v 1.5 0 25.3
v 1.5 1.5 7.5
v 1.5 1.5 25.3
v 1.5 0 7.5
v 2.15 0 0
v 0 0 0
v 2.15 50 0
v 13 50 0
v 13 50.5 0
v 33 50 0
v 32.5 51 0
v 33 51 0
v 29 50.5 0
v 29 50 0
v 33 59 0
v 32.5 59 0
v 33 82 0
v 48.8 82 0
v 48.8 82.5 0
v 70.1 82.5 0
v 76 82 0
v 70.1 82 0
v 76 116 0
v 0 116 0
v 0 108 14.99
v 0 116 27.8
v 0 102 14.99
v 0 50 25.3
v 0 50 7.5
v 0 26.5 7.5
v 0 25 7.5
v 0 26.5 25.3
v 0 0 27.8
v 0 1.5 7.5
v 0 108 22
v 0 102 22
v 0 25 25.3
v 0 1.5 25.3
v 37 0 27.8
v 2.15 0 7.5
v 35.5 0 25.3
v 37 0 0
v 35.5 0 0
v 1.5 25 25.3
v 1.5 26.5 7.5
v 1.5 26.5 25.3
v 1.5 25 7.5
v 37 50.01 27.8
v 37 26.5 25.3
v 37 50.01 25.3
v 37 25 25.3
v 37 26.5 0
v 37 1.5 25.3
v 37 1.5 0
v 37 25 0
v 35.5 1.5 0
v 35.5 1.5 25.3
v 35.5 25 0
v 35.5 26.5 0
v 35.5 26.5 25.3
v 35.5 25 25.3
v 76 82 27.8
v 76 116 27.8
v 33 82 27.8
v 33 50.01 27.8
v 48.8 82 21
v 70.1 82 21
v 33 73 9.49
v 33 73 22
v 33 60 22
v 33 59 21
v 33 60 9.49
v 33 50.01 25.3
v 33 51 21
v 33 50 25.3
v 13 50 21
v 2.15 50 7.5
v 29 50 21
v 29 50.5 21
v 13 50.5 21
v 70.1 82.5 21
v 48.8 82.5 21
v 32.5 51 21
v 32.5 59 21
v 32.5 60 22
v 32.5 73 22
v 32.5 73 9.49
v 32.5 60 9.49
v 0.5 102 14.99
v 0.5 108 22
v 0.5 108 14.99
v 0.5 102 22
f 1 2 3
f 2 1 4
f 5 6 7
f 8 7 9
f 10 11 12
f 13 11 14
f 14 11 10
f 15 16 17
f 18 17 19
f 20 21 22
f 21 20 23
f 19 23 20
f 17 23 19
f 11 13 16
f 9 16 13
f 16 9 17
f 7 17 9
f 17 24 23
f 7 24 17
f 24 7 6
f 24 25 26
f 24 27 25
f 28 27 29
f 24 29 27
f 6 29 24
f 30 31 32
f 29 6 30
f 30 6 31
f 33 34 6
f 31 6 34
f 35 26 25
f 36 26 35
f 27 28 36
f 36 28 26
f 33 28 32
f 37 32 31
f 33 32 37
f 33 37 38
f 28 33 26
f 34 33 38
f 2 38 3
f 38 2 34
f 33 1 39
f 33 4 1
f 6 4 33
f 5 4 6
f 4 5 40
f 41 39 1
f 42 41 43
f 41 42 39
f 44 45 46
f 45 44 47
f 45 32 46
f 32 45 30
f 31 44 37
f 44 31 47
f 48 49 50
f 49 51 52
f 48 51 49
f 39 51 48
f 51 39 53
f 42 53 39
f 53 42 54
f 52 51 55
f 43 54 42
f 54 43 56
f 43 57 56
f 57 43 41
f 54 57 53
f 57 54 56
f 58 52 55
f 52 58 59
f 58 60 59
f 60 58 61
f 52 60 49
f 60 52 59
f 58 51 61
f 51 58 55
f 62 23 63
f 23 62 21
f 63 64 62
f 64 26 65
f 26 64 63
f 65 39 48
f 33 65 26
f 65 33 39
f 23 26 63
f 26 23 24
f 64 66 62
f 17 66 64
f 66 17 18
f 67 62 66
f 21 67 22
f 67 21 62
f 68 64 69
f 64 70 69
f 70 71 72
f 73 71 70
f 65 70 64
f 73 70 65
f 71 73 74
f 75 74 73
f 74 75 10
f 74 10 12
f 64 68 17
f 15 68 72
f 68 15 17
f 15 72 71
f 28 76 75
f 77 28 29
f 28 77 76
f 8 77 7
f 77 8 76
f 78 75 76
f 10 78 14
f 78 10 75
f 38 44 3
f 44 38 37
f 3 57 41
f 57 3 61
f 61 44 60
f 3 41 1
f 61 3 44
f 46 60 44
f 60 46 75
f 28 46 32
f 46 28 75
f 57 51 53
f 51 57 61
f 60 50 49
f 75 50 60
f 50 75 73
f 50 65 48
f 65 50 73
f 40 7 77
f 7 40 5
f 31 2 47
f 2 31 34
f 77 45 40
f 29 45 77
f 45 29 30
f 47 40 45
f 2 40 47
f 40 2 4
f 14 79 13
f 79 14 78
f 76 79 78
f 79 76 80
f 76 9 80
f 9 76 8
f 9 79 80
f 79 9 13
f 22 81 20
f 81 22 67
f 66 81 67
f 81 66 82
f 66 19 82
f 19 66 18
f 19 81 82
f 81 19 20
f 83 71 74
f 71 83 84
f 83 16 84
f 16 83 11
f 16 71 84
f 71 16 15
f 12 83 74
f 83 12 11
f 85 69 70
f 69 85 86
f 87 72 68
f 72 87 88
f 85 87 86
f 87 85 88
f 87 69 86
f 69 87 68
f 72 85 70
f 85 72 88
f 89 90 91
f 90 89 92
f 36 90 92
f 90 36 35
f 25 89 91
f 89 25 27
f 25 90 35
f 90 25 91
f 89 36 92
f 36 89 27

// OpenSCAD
// file: _home_model.scad
// =====================================
// Home massing model
// 1:100 printable massing model of a two-storey semi with rear and side
// extensions, its plot and the garden room, from the architect's 1:50
// drawings. All figures below are real millimetres.
// =====================================
// Parts:
//   home_house        -> home_house.stl        house, roofs, bay, canopy, chimney
//   home_garden_room  -> home_garden_room.stl  L-shaped shower/office/workshop
//   home_site_front   -> home_site_front.stl   front plot tile (Y up to 15000)
//   home_site_rear    -> home_site_rear.stl    rear plot tile (Y from 15000)
//   home_assembly     -> home_assembly.stl     viewing aid, not a printable part
//
// Site frame: X east (party wall side), Y towards the rear garden, Z up;
// X = 0 at the west face of the rear extension, Y = 0 at the main house
// front face. scale_denominator divides everything at the end.

$fn = 64;

scale_denominator = 100;
s = 1 / scale_denominator;

// Print-size features (printed mm x scale_denominator)
base_t    = 3   * scale_denominator;
recess_d  = 0.6 * scale_denominator;
relief_h  = 0.5 * scale_denominator;
opening_d = 0.5 * scale_denominator;
fence_t   = 1.2 * scale_denominator;
fit_clear = 0.2 * scale_denominator;
eps = 1;

// Plot
plot_x0 = -1050;  plot_x1 =  7670;  plot_y0 = -6300;  plot_y1 = 31200;
tile_split_y = 15000;
patio_y0 = 12980;  patio_y1 = 14750;  drive_x0 = 5600;
fence_h  = 1800;  fence_y0 = 4400;  east_fence_y0 = 12980;

// Main house
main_x0 = 1970;  main_x1 = 7670;  main_y0 = 0;  main_y1 = 5871;
main_eaves_h = 5300;  main_ridge_h = 6700;  main_ridge_y = (main_y0 + main_y1) / 2;
front_overhang = 300;  verge_overhang = 150;
bay_x0 = 2820;  bay_x1 = 5370;  bay_proj = 900;  bay_h = 2700;
canopy_y = -1000;  canopy_z0 = 2350;  canopy_z1 = 2800;  canopy_t = 150;

// Rear extension and first-floor rear block
rear_x0 = 0;  rear_x1 = 7670;  rear_y0 = main_y1;  rear_y1 = 12980;
ff_x0 = 2150;  ff_x1 = 7670;  rear_eaves_h = 5100;  rear_ridge_h = 6400;
rear_ridge_x = (ff_x0 + ff_x1) / 2;  hip_len = (ff_x1 - ff_x0) / 2;
side_x0 = 0;  side_x1 = main_x0;  side_y0 = 4370;  side_y1 = main_y1;
flat_h = 3100;
chim_x0 = 1870;  chim_x1 = 2370;  chim_y0 = 3250;  chim_y1 = 3750;  chim_h = 7500;
pot_d = 250;  pot_h = 300;
rooflight_x0 = 800;  rooflight_x1 = 1550;  rooflight_y = [7900, 9700];  rooflight_l = 1000;  rooflight_d = 50;

// Garden room
gr_x0 = -280;  gr_x1 = 7320;  gr_y1 = 30855;  gr_north_y0 = gr_y1 - 3400;
gr_west_x1 = 3020;  gr_west_y0 = gr_north_y0 - 3200;
gr_wall_h = 2530;  gr_roof_t = 250;  gr_h = gr_wall_h + gr_roof_t;
cov_x1 = 3420;  cov_y0 = gr_west_y0 - 5000;
post_w = 150;  low_wall_t = 215;  low_wall_h = 750;

module box(x0, x1, y0, y1, z0, z1) { translate([x0, y0, z0]) cube([x1 - x0, y1 - y0, z1 - z0]); }
module cut_south(y, x0, x1, z0, z1) { box(x0, x1, y - eps, y + opening_d, z0 - eps, z1); }
module cut_north(y, x0, x1, z0, z1) { box(x0, x1, y - opening_d, y + eps, z0 - eps, z1); }
module cut_west(x, y0, y1, z0, z1)  { box(x - eps, x + opening_d, y0, y1, z0 - eps, z1); }
module cut_east(x, y0, y1, z0, z1)  { box(x - opening_d, x + eps, y0, y1, z0 - eps, z1); }
module yz_prism(x0, x1, pts) { translate([x0, 0, 0]) rotate([90, 0, 90]) linear_extrude(x1 - x0) polygon(pts); }

module main_roof() {
    k = (main_ridge_h - main_eaves_h) / (main_ridge_y - main_y0);
    yz_prism(main_x0 - verge_overhang, main_x1, [
        [main_y0 - front_overhang, main_eaves_h - front_overhang * k],
        [main_ridge_y, main_ridge_h], [main_y1, main_eaves_h]]);
}
// Hip prism starts under the main ridge so the union forms the valleys.
module rear_roof() {
    hull() {
        box(ff_x0, ff_x1, main_ridge_y, rear_y1, rear_eaves_h - eps, rear_eaves_h);
        box(rear_ridge_x - 1, rear_ridge_x + 1, main_ridge_y, rear_y1 - hip_len, rear_ridge_h - 1, rear_ridge_h);
    }
}
module canopy() {
    yz_prism(bay_x0, main_x1, [[canopy_y, canopy_z0], [eps, canopy_z1],
        [eps, canopy_z1 - canopy_t], [canopy_y, canopy_z0 - canopy_t]]);
}
module chimney() {
    box(chim_x0, chim_x1, chim_y0, chim_y1, 0, chim_h);
    for (x = [chim_x0 + 125, chim_x1 - 125])
        translate([x, (chim_y0 + chim_y1) / 2, chim_h - eps]) cylinder(d = pot_d, h = pot_h + eps);
}
module house_real() {
    difference() {
        union() {
            box(main_x0, main_x1, main_y0, main_y1, 0, main_eaves_h);
            box(rear_x0, rear_x1, rear_y0 - eps, rear_y1, 0, flat_h);
            box(ff_x0, ff_x1, rear_y0 - eps, rear_y1, 0, rear_eaves_h);
            box(side_x0, side_x1 + eps, side_y0, side_y1 + eps, 0, flat_h);
            box(bay_x0, bay_x1, -bay_proj, eps, 0, bay_h);
            main_roof(); rear_roof(); canopy(); chimney();
        }
        cut_south(-bay_proj, 3020, 5170, 800, 2280);      // bay window
        cut_south(main_y0, 5960, 7310, 0, 2180);          // front door + side light
        cut_south(main_y0, 2861, 4570, 3261, 4731);       // FF window west
        cut_south(main_y0, 5971, 6560, 3331, 4731);       // FF window over door
        cut_south(side_y0, 1000, 1900, 0, 2280);          // side extension door
        cut_west(rear_x0, 5900, 6800, 0, 2080);           // kitchen strip door
        cut_west(main_x0, 4800, 5700, flat_h + 50, 4810); // FF escape window
        cut_west(ff_x0, 6865, 7764, 3932, 4682);          // bath
        cut_west(ff_x0, 8456, 9055, 3932, 4682);          // en-suite
        cut_north(rear_y1, 1302, 6811, 180, 2280);        // sliding doors
        cut_north(rear_y1, 5151, 6871, 3512, 4862);       // principal bed window
        cut_north(rear_y1, 3202, 3782, 3512, 4862);       // dressing window
        for (y = rooflight_y) box(rooflight_x0, rooflight_x1, y, y + rooflight_l, flat_h - rooflight_d, flat_h + eps);
    }
}
module garden_room_real() {
    difference() {
        union() {
            box(gr_x0, gr_x1, gr_north_y0, gr_y1, 0, gr_h);
            box(gr_x0, gr_west_x1, gr_west_y0, gr_north_y0 + eps, 0, gr_h);
            box(gr_x0, cov_x1, cov_y0, gr_west_y0 + eps, gr_wall_h, gr_h);
            for (x = [gr_x0, cov_x1 - post_w], y = [cov_y0, (cov_y0 + gr_west_y0) / 2])
                box(x, x + post_w, y, y + post_w, 0, gr_wall_h + eps);
            box(gr_x0, gr_x0 + low_wall_t, cov_y0, gr_west_y0 + eps, 0, low_wall_h);
        }
        cut_south(gr_west_y0, 1020, 2620, 0, 2100);   // office doors to covered area
        cut_south(gr_north_y0, 4600, 6730, 0, 2100);  // workshop double door
        cut_east(gr_west_x1, 24355, 25155, 0, 2100);  // office door
        cut_east(gr_west_x1, 25255, 26555, 950, 2200);// office window
        cut_west(gr_x0, 29455, 30055, 1500, 2200);    // shower window
    }
}
module house_footprint_2d() {
    translate([main_x0, main_y0]) square([main_x1 - main_x0, main_y1 - main_y0]);
    translate([bay_x0, -bay_proj]) square([bay_x1 - bay_x0, bay_proj + eps]);
    translate([rear_x0, rear_y0 - eps]) square([rear_x1 - rear_x0, rear_y1 - rear_y0 + eps]);
    translate([side_x0, side_y0]) square([side_x1 - side_x0 + eps, side_y1 - side_y0 + eps]);
}
module garden_room_footprint_2d() {
    translate([gr_x0, gr_north_y0]) square([gr_x1 - gr_x0, gr_y1 - gr_north_y0]);
    translate([gr_x0, gr_west_y0]) square([gr_west_x1 - gr_x0, gr_north_y0 - gr_west_y0 + eps]);
    translate([gr_x0, cov_y0]) square([cov_x1 - gr_x0, gr_west_y0 - cov_y0 + eps]);
}
module fences() {
    box(plot_x0, plot_x0 + fence_t, fence_y0, plot_y1, 0, fence_h);
    box(plot_x1 - fence_t, plot_x1, east_fence_y0, plot_y1, 0, fence_h);
    box(plot_x0, plot_x1, plot_y1 - fence_t, plot_y1, 0, fence_h);
    box(plot_x0, 0, fence_y0, fence_y0 + fence_t, 0, fence_h);
}
module relief() {
    box(plot_x0, plot_x1, patio_y0, patio_y1, 0, base_t + relief_h);
    box(plot_x0, 0, plot_y0, rear_y1, 0, base_t + relief_h);
    box(drive_x0, plot_x1, plot_y0, -bay_proj, 0, base_t + relief_h);
}
module tile_real(y0, y1) {
    difference() {
        union() {
            box(plot_x0, plot_x1, y0, y1, 0, base_t);
            intersection() { box(plot_x0, plot_x1, y0, y1, 0, base_t + relief_h + eps); relief(); }
            intersection() { box(plot_x0, plot_x1, y0, y1, 0, base_t + fence_h + eps); translate([0, 0, base_t - eps]) fences(); }
        }
        translate([0, 0, base_t - recess_d]) linear_extrude(recess_d + relief_h + 2 * eps)
            offset(delta = fit_clear) { house_footprint_2d(); garden_room_footprint_2d(); }
    }
}
module site_front_real() { tile_real(plot_y0, tile_split_y); }
module site_rear_real()  { tile_real(tile_split_y, plot_y1); }
module home_assembly_real() {
    site_front_real(); site_rear_real();
    translate([0, 0, base_t - recess_d]) { house_real(); garden_room_real(); }
}
// main file
include <_home_model.scad>

scale(s) translate([-gr_x0, -cov_y0, 0]) garden_room_real();
